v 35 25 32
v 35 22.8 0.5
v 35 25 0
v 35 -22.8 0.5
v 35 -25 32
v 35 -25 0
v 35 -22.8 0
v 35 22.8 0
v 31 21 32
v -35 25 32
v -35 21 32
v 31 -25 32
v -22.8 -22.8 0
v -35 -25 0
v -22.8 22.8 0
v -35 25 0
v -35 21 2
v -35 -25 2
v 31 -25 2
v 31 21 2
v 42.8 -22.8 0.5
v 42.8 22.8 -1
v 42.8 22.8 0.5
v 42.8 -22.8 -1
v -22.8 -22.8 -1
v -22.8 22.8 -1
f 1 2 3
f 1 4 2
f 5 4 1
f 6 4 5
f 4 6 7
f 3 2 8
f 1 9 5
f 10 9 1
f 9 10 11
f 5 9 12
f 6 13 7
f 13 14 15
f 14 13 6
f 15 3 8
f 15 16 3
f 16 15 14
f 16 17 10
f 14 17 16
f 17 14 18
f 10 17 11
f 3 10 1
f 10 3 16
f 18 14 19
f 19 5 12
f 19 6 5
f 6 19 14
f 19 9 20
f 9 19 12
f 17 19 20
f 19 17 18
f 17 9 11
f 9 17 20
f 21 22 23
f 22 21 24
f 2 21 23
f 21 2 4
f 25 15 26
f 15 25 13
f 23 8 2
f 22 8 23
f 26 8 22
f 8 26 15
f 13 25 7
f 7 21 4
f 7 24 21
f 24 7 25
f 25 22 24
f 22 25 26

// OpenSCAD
// Two-part enclosure for small electronics board
// Print orientation: box upright, lid upside down (flat on bed)

// ---------- Parameters ----------
box_x      = 70;    // box outer length (X)
box_y      = 50;    // box outer width (Y)
box_z      = 30;    // box outer height (Z)
wall       = 2;     // box wall thickness
floor      = 2;     // box floor thickness
lip_t      = 1.5;   // lid lip thickness
lip_h      = 4;     // lid lip height
lip_x      = 65.6;  // lip outer length (X)
lip_y      = 45.6;  // lip outer width (Y)
eps        = 0.5;   // cutter overshoot past faces
gap        = 10;    // gap between box and lid

$fn = 64;

// ---------- Model ----------
union() {
    // Box
    translate([-box_x/2, -box_y/2, 0])
        difference() {
            cube([box_x, box_y, box_z + floor]);
            translate([0, 0, floor])
                cube([box_x - 2*wall, box_y - 2*wall, box_z + floor - wall]);
        }

    // Lid (printed upside down: plate on bed, lip pointing down into box)
    translate([gap - lip_x/2, -lip_y/2, 0])
        difference() {
            // Plate
            translate([0, 0, -lip_t])
                cube([lip_x, lip_y, lip_t + eps]);
            // Lip (extends below the plate by lip_h, slides into box opening)
            translate([0, 0, -lip_t - lip_h])
                cube([lip_x, lip_y, lip_h + eps]);
        }
}
